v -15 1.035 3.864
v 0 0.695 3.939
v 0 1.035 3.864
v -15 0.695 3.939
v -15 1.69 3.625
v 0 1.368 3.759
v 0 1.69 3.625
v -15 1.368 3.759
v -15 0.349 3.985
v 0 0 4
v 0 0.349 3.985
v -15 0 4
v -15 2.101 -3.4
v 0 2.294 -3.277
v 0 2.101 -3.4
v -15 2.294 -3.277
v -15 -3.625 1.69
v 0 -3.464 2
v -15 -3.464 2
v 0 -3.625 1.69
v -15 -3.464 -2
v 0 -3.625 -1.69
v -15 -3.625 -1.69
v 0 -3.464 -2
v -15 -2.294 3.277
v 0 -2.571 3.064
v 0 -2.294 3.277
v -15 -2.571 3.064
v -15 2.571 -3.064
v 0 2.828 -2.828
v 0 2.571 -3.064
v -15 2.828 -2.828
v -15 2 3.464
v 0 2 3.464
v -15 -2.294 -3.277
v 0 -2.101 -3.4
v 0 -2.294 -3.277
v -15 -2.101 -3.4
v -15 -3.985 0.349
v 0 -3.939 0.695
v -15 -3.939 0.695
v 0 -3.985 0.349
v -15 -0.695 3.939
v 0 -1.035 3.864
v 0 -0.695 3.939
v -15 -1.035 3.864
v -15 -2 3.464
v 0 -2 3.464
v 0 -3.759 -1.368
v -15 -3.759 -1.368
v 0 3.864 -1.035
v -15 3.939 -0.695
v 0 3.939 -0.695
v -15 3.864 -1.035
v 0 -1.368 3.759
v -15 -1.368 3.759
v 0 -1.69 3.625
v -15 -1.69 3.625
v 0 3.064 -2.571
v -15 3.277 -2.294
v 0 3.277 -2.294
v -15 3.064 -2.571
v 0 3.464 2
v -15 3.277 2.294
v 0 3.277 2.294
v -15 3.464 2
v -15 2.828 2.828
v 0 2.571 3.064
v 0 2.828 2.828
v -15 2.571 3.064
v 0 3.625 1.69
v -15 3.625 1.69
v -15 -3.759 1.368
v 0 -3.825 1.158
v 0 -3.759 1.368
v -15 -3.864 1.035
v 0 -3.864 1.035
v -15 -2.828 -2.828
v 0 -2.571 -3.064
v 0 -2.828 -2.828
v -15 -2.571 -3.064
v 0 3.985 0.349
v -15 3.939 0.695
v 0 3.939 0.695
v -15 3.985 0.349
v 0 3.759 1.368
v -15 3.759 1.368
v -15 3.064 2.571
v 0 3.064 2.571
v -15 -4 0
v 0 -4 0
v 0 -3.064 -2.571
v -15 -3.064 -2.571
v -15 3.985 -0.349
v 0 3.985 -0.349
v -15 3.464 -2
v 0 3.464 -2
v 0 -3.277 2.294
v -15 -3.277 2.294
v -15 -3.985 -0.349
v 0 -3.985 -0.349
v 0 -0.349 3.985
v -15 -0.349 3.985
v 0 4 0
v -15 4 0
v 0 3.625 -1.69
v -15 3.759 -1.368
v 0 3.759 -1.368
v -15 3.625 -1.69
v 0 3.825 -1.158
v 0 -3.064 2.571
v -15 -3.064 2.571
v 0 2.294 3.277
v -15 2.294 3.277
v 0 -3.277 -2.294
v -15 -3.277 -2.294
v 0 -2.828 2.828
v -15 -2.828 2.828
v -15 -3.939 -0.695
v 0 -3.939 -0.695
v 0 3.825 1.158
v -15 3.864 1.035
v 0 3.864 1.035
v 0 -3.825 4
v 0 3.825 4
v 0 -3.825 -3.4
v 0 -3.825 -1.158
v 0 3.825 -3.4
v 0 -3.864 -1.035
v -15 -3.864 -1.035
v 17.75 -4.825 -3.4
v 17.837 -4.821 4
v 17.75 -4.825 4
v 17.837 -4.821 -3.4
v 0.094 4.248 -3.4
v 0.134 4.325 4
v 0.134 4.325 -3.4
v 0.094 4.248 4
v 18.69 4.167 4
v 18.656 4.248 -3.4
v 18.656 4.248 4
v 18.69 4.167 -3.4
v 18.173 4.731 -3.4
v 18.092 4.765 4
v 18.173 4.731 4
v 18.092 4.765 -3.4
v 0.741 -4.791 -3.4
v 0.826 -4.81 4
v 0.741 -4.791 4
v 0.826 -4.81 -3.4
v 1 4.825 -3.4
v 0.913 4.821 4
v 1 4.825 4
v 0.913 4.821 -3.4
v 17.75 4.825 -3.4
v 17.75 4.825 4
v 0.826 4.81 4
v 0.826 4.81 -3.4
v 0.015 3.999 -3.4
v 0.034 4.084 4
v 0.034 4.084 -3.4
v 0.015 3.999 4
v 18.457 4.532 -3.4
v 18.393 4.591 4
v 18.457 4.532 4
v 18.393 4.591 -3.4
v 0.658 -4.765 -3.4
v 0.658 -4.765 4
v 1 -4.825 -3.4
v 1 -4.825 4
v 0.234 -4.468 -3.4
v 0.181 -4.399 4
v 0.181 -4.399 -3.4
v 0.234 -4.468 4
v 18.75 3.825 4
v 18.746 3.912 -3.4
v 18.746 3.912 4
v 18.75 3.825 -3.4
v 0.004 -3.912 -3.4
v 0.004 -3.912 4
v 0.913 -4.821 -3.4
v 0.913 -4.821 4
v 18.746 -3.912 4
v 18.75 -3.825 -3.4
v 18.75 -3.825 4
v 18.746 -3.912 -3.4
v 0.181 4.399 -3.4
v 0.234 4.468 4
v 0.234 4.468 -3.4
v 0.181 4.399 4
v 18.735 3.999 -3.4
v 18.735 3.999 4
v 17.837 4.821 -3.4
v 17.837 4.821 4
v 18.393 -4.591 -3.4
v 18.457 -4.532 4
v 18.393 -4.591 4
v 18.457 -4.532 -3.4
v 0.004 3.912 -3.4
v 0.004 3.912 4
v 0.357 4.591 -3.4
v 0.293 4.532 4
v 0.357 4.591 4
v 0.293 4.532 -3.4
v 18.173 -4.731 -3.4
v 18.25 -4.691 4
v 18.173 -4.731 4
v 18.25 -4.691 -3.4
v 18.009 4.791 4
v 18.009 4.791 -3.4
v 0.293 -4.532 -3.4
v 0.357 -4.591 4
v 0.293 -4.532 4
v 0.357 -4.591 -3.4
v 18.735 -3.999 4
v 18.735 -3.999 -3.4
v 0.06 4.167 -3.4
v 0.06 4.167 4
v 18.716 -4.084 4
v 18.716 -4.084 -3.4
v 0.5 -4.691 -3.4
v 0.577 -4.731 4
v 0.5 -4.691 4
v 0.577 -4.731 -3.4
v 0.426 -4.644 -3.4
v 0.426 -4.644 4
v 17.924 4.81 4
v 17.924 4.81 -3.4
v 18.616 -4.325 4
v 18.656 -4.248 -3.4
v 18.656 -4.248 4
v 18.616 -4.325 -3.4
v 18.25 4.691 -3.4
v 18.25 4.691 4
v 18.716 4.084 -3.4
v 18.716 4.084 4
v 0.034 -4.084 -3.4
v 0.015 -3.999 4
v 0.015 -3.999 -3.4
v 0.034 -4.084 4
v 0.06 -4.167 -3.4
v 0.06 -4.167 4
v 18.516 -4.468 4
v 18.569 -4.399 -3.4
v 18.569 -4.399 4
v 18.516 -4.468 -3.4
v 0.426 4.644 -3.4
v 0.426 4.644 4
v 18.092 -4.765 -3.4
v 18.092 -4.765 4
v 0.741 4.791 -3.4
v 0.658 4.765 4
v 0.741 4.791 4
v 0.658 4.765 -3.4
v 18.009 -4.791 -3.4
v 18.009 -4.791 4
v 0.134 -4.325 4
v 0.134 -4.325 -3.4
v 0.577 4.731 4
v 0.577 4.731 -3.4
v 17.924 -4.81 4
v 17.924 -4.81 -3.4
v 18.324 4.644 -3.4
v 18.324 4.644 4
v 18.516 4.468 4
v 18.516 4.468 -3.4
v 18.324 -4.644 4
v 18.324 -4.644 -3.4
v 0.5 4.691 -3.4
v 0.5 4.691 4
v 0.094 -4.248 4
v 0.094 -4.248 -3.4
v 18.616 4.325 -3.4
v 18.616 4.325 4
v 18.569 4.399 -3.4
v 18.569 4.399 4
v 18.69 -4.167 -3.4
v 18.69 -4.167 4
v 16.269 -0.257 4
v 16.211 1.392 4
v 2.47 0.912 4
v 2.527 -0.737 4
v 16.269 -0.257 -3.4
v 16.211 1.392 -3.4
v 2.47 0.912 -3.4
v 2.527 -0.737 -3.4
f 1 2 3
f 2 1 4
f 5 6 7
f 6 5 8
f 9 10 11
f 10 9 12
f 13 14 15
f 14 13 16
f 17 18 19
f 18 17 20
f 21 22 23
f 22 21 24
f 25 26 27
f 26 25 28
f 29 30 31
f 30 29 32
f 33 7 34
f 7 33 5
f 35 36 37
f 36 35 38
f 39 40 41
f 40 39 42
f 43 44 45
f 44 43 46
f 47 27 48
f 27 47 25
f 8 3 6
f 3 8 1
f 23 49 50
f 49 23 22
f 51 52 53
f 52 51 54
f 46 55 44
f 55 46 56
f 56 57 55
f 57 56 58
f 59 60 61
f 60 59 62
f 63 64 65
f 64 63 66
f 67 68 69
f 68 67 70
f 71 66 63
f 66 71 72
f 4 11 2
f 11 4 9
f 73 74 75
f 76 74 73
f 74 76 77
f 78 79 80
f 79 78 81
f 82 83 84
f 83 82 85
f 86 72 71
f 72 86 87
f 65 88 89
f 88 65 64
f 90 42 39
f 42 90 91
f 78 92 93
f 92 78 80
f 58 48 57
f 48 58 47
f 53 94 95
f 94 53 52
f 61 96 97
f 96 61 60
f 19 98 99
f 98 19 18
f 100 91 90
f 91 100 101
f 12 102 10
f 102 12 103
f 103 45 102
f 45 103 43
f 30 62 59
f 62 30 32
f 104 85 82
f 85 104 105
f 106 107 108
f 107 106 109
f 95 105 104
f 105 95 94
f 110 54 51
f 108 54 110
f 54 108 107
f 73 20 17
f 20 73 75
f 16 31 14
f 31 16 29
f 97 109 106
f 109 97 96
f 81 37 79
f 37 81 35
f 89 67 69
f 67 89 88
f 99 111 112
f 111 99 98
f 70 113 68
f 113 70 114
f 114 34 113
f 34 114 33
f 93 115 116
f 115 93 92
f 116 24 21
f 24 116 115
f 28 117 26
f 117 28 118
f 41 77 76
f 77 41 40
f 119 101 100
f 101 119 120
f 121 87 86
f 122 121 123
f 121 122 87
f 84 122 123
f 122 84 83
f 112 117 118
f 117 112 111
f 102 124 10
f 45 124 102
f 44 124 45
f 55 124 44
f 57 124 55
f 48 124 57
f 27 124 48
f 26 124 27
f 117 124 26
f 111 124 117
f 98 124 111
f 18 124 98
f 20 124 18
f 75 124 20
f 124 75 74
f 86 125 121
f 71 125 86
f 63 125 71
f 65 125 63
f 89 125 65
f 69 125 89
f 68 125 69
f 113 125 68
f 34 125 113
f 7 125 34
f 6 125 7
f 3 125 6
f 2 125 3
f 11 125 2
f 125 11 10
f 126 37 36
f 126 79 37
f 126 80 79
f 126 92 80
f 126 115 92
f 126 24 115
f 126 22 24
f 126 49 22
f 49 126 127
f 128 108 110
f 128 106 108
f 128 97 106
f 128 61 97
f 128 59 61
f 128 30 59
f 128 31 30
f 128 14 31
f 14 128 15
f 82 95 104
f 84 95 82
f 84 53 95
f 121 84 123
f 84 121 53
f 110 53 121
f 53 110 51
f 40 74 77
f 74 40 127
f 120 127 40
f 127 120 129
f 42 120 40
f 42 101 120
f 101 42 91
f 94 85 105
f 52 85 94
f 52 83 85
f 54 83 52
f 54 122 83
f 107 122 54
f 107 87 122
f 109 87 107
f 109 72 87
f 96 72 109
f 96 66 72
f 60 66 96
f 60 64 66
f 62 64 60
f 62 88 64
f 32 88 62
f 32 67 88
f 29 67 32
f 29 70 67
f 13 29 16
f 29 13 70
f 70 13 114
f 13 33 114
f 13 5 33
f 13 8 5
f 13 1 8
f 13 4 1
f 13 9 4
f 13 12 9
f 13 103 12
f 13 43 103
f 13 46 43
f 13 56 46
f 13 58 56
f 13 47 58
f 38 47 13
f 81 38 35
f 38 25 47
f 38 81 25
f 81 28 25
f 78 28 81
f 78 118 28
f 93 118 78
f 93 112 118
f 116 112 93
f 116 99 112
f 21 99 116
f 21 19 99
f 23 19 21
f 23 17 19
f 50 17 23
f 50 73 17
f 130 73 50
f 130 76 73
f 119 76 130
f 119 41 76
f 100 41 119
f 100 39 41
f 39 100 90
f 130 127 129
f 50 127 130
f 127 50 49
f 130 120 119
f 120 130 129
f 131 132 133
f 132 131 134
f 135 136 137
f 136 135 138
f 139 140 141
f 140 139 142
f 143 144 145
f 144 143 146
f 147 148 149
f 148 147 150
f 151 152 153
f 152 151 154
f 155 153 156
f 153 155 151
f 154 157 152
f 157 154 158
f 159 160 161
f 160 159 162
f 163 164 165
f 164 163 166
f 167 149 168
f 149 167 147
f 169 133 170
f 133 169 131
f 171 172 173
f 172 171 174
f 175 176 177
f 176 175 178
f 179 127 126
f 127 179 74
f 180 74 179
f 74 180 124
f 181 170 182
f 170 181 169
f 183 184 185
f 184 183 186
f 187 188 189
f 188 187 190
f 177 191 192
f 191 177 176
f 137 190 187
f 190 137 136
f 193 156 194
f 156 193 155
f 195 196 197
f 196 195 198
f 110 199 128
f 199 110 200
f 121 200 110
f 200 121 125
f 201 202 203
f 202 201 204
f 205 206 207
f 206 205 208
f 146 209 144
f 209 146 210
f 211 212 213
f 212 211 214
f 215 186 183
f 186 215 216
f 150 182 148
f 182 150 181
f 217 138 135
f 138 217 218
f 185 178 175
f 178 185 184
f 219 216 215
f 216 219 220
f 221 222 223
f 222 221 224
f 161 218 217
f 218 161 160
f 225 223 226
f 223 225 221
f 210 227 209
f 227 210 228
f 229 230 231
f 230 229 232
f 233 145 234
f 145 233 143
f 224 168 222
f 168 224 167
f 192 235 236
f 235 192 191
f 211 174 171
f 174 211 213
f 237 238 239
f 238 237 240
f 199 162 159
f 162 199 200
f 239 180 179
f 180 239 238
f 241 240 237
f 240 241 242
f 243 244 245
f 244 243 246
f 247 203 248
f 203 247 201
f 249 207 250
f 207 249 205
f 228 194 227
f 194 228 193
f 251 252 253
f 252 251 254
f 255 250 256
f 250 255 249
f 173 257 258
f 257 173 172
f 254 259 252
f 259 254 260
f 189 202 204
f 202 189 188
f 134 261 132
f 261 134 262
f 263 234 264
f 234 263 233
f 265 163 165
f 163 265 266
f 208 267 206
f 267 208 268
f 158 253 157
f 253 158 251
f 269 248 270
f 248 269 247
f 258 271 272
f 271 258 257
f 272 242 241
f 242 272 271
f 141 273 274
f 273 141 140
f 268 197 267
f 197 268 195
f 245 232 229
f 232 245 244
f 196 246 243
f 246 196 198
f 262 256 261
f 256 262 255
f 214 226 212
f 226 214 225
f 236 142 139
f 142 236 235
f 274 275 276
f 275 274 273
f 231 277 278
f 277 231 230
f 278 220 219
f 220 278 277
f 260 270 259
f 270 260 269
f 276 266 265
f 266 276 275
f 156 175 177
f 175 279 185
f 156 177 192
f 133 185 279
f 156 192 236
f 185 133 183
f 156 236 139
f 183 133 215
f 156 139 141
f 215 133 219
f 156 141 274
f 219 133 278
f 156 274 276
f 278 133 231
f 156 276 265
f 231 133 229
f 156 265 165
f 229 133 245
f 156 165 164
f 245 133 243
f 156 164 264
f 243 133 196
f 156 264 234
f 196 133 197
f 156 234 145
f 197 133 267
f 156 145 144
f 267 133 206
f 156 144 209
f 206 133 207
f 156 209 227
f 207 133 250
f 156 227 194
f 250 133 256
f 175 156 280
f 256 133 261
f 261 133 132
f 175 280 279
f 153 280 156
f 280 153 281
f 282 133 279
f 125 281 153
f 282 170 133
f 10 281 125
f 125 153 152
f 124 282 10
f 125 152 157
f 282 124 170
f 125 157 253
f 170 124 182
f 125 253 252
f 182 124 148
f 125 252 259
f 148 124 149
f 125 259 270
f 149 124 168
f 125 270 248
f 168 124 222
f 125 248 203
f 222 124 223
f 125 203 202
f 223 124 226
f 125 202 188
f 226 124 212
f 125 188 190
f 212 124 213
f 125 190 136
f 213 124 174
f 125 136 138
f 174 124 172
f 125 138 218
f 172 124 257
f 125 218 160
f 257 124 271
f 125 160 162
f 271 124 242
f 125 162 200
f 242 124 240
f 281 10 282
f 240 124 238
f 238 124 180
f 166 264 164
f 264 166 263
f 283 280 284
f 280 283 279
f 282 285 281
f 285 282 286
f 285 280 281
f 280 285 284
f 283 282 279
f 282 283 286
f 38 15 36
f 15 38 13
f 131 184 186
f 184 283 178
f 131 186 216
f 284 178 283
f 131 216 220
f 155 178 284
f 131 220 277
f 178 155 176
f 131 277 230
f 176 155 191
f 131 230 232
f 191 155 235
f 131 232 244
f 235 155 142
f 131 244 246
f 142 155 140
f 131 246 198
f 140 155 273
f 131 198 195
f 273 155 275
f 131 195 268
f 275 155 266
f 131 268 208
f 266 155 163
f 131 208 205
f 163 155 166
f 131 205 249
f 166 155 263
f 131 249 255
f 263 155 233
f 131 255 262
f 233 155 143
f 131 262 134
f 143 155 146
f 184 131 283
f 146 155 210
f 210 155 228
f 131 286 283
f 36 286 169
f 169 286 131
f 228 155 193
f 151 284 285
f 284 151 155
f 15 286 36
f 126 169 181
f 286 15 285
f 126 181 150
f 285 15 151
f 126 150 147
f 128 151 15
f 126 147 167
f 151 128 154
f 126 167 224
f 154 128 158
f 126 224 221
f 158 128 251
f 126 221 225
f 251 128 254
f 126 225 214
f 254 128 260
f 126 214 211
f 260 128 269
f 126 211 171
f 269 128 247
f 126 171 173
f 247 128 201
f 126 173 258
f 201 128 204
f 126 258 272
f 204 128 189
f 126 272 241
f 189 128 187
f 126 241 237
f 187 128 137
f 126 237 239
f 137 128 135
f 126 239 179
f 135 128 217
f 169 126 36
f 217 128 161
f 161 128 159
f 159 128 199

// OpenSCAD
Gap = 0.2;
$fn = 72;

RodConnect();

module RodConnect() {
    RodThickness = 1.65; // 1/16 inch + 0.7mm gap
    RodDepth = 13.75; // 1/2 inch + 0.5mm gap
    
    BearingDiameter = 8.0;
    BearingLength = 15;
    
    ConnectorShift = 0.3;
    
    ConnectorWidth = RodThickness+8;
    ConnectorDepth = RodDepth+5;
    
    CornerRadius = 1;
    
    intersection() {
        translate([0,0,ConnectorShift])
            cube([200,200,BearingDiameter - 2 * ConnectorShift], center=true);
        difference() {
            union () {
                rotate([0,-90,0])
                    cylinder(r = BearingDiameter/2, h = BearingLength);
                
                rotate([0,-90,0])
                    cylinder(r = BearingDiameter/2,
                             h = 5);
                
                linear_extrude(height=BearingDiameter, center=true)
                    offset(r=CornerRadius)
                        polygon([[CornerRadius, -ConnectorWidth/2 + CornerRadius],
                                 [ConnectorDepth - CornerRadius,
                                  -ConnectorWidth/2 + CornerRadius],
                                 [ConnectorDepth - CornerRadius,
                                  ConnectorWidth/2 - CornerRadius],
                                 [CornerRadius,
                                  ConnectorWidth/2 - CornerRadius]]);
            }
            
            union () {
                rotate([0,0,2])
                    translate([ConnectorDepth/2,0,0])
                        cube([RodDepth, RodThickness, 100], center = true);
            }
        }
    }    
}
